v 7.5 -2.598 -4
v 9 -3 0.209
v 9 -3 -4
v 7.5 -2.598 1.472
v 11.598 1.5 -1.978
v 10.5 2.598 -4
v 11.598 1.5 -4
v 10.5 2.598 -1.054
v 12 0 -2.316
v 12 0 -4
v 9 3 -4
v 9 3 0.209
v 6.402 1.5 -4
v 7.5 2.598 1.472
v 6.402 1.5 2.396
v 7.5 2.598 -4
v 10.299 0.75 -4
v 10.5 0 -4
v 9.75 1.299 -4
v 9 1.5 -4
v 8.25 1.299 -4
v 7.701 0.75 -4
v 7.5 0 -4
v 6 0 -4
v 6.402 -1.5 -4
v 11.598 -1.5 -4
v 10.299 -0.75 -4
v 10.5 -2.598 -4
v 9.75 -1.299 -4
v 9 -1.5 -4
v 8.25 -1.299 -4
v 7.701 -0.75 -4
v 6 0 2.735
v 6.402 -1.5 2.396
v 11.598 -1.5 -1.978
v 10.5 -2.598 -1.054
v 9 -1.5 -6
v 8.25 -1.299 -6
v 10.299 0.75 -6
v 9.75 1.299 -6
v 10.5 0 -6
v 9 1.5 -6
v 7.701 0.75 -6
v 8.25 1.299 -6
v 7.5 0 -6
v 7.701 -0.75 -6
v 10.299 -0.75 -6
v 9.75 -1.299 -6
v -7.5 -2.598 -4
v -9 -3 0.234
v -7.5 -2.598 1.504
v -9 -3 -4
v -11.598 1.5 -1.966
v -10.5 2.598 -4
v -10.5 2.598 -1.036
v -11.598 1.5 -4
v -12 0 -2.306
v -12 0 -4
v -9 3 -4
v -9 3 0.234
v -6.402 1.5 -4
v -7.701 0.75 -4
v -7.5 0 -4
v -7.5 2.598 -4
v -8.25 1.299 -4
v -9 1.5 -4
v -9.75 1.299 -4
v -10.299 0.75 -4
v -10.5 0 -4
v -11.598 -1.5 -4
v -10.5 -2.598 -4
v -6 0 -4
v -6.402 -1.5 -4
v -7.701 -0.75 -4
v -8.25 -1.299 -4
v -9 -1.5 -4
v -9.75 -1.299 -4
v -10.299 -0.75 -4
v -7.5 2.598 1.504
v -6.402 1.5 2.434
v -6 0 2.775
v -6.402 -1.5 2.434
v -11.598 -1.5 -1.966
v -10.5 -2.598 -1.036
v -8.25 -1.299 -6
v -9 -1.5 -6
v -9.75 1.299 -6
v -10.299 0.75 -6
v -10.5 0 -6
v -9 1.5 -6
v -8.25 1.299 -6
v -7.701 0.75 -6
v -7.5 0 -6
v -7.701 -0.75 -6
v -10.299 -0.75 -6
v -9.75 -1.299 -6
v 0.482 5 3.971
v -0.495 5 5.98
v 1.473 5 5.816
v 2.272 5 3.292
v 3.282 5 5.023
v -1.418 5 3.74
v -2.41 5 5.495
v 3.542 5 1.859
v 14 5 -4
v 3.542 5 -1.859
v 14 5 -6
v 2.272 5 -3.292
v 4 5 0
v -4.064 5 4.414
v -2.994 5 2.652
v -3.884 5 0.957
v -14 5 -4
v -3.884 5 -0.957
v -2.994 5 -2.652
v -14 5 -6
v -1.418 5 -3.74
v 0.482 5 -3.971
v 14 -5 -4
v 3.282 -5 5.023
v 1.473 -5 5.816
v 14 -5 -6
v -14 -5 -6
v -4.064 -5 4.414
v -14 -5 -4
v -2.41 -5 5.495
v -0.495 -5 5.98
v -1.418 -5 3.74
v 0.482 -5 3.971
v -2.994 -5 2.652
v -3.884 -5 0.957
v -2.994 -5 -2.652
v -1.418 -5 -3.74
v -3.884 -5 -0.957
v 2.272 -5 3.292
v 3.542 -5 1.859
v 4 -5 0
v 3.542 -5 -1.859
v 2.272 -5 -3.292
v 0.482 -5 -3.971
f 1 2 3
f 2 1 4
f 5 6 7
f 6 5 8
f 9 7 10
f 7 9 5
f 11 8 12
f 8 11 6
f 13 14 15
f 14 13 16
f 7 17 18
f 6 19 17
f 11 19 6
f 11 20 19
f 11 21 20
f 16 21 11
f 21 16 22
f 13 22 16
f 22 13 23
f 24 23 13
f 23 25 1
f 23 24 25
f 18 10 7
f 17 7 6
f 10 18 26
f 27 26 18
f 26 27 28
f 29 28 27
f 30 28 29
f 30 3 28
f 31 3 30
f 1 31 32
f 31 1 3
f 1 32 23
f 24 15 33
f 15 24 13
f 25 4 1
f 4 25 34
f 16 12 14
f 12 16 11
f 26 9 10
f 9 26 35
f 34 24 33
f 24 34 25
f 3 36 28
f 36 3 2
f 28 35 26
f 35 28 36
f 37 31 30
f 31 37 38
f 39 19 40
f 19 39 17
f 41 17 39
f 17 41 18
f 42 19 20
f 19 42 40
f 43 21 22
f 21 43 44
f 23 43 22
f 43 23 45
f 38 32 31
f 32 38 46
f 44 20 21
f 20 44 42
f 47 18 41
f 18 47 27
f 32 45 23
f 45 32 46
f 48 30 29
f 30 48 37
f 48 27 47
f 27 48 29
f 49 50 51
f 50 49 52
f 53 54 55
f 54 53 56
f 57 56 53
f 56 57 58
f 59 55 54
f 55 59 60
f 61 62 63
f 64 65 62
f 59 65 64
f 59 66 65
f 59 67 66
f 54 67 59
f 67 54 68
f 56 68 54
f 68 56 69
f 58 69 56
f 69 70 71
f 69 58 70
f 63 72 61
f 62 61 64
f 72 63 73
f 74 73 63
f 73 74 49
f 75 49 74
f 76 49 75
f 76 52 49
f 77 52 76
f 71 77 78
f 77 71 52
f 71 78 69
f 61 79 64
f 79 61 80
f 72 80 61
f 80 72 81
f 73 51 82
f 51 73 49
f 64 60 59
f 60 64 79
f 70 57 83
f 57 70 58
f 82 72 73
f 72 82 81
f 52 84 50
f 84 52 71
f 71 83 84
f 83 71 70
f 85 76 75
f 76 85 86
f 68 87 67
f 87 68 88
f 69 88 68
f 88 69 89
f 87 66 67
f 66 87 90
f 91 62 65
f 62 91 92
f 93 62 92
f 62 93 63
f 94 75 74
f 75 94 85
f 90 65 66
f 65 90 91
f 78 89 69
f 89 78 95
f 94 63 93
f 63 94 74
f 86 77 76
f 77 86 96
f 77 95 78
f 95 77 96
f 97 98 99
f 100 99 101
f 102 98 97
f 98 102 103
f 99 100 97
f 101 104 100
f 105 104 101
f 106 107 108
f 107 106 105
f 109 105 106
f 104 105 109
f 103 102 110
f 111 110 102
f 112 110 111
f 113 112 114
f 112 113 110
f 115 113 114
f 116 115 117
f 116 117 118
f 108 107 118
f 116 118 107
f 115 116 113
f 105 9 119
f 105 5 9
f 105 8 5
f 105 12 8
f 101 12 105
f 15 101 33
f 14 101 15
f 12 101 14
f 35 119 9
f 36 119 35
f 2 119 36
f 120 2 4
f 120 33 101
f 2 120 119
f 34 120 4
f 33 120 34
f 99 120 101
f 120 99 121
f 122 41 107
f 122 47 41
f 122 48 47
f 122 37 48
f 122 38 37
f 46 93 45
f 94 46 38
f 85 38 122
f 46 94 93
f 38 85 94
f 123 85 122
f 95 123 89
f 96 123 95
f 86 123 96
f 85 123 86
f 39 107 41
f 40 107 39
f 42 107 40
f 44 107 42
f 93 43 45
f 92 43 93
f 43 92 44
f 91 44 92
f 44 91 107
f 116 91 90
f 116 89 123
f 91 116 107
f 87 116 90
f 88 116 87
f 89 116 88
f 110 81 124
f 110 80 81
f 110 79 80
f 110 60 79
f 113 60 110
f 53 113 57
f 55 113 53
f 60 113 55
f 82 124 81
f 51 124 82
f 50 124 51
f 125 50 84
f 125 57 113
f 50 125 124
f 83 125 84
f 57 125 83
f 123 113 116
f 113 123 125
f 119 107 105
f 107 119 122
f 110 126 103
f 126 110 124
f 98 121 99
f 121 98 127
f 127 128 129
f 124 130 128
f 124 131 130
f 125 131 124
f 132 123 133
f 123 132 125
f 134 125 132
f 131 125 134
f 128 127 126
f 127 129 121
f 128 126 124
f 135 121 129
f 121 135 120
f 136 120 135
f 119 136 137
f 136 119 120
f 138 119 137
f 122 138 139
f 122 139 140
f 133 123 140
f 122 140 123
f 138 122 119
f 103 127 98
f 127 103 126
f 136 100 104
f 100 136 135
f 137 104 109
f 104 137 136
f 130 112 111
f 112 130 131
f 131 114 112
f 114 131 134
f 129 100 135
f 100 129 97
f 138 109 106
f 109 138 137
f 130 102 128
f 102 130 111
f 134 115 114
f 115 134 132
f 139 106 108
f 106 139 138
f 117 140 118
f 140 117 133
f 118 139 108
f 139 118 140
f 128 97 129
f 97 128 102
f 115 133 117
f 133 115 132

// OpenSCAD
// rod radius
r_rod = 4;

// mounting hole radius, 1.5mm for M3 screw
r_clearance = 1.5;
// mounting hole countersink, 3mm for M3 screw
r_countersink = 3;

// width of mount
w_mount = 10;

// thickness of mount material
t_mount = 2;

difference() {
  // main shape
  hull() {
    rotate([90, 0, 0]) {
      difference() {
        cylinder(w_mount, r = r_rod+t_mount, center = true);
      }
    }
    translate([0, 0, -(r_rod+t_mount/2)]) {
      cube([4*r_countersink+2*r_rod+4*t_mount, w_mount, t_mount], center = true);
    }
  }

  // rod cutout
  rotate([90, 0, 0]) {
    cylinder(2*w_mount, r = r_rod, center = true);
  }

  // screw holes
  screw_hole();
  mirror([1, 0, 0]) {
    screw_hole();
  }
}

module screw_hole() {
  x_offset = r_rod+r_countersink+t_mount;
  translate([x_offset, 0, t_mount]) {
    cylinder(2*(r_rod+t_mount), r = r_countersink, center = true, $fn = 12);
  }
  translate([x_offset, 0, 0]) {
    cylinder(3*(r_rod+t_mount), r = r_clearance, center = true, $fn = 12);
  }
}
